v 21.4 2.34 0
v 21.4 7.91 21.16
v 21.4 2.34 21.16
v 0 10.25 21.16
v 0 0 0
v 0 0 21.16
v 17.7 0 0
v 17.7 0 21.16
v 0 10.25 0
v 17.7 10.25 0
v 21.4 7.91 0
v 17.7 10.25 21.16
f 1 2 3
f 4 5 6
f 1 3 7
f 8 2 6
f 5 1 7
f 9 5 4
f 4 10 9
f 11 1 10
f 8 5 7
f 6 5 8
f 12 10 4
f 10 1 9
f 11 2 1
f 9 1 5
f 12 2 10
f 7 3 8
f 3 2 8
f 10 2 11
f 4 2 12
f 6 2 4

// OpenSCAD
yyy = 10.25;
xxx = 17.7;
yyy2 = 5.57;
xxx2 = 21.4;
h = 21.16;

function xt_90_m_sizes()=[xxx2, yyy, h];

module xt_90_m(){
    
    hull(){
        cube([xxx,yyy, h]);
        translate([0, yyy/2 - yyy2/2])
            cube([xxx2,yyy2, h]);
    }
}
xt_90_m();
